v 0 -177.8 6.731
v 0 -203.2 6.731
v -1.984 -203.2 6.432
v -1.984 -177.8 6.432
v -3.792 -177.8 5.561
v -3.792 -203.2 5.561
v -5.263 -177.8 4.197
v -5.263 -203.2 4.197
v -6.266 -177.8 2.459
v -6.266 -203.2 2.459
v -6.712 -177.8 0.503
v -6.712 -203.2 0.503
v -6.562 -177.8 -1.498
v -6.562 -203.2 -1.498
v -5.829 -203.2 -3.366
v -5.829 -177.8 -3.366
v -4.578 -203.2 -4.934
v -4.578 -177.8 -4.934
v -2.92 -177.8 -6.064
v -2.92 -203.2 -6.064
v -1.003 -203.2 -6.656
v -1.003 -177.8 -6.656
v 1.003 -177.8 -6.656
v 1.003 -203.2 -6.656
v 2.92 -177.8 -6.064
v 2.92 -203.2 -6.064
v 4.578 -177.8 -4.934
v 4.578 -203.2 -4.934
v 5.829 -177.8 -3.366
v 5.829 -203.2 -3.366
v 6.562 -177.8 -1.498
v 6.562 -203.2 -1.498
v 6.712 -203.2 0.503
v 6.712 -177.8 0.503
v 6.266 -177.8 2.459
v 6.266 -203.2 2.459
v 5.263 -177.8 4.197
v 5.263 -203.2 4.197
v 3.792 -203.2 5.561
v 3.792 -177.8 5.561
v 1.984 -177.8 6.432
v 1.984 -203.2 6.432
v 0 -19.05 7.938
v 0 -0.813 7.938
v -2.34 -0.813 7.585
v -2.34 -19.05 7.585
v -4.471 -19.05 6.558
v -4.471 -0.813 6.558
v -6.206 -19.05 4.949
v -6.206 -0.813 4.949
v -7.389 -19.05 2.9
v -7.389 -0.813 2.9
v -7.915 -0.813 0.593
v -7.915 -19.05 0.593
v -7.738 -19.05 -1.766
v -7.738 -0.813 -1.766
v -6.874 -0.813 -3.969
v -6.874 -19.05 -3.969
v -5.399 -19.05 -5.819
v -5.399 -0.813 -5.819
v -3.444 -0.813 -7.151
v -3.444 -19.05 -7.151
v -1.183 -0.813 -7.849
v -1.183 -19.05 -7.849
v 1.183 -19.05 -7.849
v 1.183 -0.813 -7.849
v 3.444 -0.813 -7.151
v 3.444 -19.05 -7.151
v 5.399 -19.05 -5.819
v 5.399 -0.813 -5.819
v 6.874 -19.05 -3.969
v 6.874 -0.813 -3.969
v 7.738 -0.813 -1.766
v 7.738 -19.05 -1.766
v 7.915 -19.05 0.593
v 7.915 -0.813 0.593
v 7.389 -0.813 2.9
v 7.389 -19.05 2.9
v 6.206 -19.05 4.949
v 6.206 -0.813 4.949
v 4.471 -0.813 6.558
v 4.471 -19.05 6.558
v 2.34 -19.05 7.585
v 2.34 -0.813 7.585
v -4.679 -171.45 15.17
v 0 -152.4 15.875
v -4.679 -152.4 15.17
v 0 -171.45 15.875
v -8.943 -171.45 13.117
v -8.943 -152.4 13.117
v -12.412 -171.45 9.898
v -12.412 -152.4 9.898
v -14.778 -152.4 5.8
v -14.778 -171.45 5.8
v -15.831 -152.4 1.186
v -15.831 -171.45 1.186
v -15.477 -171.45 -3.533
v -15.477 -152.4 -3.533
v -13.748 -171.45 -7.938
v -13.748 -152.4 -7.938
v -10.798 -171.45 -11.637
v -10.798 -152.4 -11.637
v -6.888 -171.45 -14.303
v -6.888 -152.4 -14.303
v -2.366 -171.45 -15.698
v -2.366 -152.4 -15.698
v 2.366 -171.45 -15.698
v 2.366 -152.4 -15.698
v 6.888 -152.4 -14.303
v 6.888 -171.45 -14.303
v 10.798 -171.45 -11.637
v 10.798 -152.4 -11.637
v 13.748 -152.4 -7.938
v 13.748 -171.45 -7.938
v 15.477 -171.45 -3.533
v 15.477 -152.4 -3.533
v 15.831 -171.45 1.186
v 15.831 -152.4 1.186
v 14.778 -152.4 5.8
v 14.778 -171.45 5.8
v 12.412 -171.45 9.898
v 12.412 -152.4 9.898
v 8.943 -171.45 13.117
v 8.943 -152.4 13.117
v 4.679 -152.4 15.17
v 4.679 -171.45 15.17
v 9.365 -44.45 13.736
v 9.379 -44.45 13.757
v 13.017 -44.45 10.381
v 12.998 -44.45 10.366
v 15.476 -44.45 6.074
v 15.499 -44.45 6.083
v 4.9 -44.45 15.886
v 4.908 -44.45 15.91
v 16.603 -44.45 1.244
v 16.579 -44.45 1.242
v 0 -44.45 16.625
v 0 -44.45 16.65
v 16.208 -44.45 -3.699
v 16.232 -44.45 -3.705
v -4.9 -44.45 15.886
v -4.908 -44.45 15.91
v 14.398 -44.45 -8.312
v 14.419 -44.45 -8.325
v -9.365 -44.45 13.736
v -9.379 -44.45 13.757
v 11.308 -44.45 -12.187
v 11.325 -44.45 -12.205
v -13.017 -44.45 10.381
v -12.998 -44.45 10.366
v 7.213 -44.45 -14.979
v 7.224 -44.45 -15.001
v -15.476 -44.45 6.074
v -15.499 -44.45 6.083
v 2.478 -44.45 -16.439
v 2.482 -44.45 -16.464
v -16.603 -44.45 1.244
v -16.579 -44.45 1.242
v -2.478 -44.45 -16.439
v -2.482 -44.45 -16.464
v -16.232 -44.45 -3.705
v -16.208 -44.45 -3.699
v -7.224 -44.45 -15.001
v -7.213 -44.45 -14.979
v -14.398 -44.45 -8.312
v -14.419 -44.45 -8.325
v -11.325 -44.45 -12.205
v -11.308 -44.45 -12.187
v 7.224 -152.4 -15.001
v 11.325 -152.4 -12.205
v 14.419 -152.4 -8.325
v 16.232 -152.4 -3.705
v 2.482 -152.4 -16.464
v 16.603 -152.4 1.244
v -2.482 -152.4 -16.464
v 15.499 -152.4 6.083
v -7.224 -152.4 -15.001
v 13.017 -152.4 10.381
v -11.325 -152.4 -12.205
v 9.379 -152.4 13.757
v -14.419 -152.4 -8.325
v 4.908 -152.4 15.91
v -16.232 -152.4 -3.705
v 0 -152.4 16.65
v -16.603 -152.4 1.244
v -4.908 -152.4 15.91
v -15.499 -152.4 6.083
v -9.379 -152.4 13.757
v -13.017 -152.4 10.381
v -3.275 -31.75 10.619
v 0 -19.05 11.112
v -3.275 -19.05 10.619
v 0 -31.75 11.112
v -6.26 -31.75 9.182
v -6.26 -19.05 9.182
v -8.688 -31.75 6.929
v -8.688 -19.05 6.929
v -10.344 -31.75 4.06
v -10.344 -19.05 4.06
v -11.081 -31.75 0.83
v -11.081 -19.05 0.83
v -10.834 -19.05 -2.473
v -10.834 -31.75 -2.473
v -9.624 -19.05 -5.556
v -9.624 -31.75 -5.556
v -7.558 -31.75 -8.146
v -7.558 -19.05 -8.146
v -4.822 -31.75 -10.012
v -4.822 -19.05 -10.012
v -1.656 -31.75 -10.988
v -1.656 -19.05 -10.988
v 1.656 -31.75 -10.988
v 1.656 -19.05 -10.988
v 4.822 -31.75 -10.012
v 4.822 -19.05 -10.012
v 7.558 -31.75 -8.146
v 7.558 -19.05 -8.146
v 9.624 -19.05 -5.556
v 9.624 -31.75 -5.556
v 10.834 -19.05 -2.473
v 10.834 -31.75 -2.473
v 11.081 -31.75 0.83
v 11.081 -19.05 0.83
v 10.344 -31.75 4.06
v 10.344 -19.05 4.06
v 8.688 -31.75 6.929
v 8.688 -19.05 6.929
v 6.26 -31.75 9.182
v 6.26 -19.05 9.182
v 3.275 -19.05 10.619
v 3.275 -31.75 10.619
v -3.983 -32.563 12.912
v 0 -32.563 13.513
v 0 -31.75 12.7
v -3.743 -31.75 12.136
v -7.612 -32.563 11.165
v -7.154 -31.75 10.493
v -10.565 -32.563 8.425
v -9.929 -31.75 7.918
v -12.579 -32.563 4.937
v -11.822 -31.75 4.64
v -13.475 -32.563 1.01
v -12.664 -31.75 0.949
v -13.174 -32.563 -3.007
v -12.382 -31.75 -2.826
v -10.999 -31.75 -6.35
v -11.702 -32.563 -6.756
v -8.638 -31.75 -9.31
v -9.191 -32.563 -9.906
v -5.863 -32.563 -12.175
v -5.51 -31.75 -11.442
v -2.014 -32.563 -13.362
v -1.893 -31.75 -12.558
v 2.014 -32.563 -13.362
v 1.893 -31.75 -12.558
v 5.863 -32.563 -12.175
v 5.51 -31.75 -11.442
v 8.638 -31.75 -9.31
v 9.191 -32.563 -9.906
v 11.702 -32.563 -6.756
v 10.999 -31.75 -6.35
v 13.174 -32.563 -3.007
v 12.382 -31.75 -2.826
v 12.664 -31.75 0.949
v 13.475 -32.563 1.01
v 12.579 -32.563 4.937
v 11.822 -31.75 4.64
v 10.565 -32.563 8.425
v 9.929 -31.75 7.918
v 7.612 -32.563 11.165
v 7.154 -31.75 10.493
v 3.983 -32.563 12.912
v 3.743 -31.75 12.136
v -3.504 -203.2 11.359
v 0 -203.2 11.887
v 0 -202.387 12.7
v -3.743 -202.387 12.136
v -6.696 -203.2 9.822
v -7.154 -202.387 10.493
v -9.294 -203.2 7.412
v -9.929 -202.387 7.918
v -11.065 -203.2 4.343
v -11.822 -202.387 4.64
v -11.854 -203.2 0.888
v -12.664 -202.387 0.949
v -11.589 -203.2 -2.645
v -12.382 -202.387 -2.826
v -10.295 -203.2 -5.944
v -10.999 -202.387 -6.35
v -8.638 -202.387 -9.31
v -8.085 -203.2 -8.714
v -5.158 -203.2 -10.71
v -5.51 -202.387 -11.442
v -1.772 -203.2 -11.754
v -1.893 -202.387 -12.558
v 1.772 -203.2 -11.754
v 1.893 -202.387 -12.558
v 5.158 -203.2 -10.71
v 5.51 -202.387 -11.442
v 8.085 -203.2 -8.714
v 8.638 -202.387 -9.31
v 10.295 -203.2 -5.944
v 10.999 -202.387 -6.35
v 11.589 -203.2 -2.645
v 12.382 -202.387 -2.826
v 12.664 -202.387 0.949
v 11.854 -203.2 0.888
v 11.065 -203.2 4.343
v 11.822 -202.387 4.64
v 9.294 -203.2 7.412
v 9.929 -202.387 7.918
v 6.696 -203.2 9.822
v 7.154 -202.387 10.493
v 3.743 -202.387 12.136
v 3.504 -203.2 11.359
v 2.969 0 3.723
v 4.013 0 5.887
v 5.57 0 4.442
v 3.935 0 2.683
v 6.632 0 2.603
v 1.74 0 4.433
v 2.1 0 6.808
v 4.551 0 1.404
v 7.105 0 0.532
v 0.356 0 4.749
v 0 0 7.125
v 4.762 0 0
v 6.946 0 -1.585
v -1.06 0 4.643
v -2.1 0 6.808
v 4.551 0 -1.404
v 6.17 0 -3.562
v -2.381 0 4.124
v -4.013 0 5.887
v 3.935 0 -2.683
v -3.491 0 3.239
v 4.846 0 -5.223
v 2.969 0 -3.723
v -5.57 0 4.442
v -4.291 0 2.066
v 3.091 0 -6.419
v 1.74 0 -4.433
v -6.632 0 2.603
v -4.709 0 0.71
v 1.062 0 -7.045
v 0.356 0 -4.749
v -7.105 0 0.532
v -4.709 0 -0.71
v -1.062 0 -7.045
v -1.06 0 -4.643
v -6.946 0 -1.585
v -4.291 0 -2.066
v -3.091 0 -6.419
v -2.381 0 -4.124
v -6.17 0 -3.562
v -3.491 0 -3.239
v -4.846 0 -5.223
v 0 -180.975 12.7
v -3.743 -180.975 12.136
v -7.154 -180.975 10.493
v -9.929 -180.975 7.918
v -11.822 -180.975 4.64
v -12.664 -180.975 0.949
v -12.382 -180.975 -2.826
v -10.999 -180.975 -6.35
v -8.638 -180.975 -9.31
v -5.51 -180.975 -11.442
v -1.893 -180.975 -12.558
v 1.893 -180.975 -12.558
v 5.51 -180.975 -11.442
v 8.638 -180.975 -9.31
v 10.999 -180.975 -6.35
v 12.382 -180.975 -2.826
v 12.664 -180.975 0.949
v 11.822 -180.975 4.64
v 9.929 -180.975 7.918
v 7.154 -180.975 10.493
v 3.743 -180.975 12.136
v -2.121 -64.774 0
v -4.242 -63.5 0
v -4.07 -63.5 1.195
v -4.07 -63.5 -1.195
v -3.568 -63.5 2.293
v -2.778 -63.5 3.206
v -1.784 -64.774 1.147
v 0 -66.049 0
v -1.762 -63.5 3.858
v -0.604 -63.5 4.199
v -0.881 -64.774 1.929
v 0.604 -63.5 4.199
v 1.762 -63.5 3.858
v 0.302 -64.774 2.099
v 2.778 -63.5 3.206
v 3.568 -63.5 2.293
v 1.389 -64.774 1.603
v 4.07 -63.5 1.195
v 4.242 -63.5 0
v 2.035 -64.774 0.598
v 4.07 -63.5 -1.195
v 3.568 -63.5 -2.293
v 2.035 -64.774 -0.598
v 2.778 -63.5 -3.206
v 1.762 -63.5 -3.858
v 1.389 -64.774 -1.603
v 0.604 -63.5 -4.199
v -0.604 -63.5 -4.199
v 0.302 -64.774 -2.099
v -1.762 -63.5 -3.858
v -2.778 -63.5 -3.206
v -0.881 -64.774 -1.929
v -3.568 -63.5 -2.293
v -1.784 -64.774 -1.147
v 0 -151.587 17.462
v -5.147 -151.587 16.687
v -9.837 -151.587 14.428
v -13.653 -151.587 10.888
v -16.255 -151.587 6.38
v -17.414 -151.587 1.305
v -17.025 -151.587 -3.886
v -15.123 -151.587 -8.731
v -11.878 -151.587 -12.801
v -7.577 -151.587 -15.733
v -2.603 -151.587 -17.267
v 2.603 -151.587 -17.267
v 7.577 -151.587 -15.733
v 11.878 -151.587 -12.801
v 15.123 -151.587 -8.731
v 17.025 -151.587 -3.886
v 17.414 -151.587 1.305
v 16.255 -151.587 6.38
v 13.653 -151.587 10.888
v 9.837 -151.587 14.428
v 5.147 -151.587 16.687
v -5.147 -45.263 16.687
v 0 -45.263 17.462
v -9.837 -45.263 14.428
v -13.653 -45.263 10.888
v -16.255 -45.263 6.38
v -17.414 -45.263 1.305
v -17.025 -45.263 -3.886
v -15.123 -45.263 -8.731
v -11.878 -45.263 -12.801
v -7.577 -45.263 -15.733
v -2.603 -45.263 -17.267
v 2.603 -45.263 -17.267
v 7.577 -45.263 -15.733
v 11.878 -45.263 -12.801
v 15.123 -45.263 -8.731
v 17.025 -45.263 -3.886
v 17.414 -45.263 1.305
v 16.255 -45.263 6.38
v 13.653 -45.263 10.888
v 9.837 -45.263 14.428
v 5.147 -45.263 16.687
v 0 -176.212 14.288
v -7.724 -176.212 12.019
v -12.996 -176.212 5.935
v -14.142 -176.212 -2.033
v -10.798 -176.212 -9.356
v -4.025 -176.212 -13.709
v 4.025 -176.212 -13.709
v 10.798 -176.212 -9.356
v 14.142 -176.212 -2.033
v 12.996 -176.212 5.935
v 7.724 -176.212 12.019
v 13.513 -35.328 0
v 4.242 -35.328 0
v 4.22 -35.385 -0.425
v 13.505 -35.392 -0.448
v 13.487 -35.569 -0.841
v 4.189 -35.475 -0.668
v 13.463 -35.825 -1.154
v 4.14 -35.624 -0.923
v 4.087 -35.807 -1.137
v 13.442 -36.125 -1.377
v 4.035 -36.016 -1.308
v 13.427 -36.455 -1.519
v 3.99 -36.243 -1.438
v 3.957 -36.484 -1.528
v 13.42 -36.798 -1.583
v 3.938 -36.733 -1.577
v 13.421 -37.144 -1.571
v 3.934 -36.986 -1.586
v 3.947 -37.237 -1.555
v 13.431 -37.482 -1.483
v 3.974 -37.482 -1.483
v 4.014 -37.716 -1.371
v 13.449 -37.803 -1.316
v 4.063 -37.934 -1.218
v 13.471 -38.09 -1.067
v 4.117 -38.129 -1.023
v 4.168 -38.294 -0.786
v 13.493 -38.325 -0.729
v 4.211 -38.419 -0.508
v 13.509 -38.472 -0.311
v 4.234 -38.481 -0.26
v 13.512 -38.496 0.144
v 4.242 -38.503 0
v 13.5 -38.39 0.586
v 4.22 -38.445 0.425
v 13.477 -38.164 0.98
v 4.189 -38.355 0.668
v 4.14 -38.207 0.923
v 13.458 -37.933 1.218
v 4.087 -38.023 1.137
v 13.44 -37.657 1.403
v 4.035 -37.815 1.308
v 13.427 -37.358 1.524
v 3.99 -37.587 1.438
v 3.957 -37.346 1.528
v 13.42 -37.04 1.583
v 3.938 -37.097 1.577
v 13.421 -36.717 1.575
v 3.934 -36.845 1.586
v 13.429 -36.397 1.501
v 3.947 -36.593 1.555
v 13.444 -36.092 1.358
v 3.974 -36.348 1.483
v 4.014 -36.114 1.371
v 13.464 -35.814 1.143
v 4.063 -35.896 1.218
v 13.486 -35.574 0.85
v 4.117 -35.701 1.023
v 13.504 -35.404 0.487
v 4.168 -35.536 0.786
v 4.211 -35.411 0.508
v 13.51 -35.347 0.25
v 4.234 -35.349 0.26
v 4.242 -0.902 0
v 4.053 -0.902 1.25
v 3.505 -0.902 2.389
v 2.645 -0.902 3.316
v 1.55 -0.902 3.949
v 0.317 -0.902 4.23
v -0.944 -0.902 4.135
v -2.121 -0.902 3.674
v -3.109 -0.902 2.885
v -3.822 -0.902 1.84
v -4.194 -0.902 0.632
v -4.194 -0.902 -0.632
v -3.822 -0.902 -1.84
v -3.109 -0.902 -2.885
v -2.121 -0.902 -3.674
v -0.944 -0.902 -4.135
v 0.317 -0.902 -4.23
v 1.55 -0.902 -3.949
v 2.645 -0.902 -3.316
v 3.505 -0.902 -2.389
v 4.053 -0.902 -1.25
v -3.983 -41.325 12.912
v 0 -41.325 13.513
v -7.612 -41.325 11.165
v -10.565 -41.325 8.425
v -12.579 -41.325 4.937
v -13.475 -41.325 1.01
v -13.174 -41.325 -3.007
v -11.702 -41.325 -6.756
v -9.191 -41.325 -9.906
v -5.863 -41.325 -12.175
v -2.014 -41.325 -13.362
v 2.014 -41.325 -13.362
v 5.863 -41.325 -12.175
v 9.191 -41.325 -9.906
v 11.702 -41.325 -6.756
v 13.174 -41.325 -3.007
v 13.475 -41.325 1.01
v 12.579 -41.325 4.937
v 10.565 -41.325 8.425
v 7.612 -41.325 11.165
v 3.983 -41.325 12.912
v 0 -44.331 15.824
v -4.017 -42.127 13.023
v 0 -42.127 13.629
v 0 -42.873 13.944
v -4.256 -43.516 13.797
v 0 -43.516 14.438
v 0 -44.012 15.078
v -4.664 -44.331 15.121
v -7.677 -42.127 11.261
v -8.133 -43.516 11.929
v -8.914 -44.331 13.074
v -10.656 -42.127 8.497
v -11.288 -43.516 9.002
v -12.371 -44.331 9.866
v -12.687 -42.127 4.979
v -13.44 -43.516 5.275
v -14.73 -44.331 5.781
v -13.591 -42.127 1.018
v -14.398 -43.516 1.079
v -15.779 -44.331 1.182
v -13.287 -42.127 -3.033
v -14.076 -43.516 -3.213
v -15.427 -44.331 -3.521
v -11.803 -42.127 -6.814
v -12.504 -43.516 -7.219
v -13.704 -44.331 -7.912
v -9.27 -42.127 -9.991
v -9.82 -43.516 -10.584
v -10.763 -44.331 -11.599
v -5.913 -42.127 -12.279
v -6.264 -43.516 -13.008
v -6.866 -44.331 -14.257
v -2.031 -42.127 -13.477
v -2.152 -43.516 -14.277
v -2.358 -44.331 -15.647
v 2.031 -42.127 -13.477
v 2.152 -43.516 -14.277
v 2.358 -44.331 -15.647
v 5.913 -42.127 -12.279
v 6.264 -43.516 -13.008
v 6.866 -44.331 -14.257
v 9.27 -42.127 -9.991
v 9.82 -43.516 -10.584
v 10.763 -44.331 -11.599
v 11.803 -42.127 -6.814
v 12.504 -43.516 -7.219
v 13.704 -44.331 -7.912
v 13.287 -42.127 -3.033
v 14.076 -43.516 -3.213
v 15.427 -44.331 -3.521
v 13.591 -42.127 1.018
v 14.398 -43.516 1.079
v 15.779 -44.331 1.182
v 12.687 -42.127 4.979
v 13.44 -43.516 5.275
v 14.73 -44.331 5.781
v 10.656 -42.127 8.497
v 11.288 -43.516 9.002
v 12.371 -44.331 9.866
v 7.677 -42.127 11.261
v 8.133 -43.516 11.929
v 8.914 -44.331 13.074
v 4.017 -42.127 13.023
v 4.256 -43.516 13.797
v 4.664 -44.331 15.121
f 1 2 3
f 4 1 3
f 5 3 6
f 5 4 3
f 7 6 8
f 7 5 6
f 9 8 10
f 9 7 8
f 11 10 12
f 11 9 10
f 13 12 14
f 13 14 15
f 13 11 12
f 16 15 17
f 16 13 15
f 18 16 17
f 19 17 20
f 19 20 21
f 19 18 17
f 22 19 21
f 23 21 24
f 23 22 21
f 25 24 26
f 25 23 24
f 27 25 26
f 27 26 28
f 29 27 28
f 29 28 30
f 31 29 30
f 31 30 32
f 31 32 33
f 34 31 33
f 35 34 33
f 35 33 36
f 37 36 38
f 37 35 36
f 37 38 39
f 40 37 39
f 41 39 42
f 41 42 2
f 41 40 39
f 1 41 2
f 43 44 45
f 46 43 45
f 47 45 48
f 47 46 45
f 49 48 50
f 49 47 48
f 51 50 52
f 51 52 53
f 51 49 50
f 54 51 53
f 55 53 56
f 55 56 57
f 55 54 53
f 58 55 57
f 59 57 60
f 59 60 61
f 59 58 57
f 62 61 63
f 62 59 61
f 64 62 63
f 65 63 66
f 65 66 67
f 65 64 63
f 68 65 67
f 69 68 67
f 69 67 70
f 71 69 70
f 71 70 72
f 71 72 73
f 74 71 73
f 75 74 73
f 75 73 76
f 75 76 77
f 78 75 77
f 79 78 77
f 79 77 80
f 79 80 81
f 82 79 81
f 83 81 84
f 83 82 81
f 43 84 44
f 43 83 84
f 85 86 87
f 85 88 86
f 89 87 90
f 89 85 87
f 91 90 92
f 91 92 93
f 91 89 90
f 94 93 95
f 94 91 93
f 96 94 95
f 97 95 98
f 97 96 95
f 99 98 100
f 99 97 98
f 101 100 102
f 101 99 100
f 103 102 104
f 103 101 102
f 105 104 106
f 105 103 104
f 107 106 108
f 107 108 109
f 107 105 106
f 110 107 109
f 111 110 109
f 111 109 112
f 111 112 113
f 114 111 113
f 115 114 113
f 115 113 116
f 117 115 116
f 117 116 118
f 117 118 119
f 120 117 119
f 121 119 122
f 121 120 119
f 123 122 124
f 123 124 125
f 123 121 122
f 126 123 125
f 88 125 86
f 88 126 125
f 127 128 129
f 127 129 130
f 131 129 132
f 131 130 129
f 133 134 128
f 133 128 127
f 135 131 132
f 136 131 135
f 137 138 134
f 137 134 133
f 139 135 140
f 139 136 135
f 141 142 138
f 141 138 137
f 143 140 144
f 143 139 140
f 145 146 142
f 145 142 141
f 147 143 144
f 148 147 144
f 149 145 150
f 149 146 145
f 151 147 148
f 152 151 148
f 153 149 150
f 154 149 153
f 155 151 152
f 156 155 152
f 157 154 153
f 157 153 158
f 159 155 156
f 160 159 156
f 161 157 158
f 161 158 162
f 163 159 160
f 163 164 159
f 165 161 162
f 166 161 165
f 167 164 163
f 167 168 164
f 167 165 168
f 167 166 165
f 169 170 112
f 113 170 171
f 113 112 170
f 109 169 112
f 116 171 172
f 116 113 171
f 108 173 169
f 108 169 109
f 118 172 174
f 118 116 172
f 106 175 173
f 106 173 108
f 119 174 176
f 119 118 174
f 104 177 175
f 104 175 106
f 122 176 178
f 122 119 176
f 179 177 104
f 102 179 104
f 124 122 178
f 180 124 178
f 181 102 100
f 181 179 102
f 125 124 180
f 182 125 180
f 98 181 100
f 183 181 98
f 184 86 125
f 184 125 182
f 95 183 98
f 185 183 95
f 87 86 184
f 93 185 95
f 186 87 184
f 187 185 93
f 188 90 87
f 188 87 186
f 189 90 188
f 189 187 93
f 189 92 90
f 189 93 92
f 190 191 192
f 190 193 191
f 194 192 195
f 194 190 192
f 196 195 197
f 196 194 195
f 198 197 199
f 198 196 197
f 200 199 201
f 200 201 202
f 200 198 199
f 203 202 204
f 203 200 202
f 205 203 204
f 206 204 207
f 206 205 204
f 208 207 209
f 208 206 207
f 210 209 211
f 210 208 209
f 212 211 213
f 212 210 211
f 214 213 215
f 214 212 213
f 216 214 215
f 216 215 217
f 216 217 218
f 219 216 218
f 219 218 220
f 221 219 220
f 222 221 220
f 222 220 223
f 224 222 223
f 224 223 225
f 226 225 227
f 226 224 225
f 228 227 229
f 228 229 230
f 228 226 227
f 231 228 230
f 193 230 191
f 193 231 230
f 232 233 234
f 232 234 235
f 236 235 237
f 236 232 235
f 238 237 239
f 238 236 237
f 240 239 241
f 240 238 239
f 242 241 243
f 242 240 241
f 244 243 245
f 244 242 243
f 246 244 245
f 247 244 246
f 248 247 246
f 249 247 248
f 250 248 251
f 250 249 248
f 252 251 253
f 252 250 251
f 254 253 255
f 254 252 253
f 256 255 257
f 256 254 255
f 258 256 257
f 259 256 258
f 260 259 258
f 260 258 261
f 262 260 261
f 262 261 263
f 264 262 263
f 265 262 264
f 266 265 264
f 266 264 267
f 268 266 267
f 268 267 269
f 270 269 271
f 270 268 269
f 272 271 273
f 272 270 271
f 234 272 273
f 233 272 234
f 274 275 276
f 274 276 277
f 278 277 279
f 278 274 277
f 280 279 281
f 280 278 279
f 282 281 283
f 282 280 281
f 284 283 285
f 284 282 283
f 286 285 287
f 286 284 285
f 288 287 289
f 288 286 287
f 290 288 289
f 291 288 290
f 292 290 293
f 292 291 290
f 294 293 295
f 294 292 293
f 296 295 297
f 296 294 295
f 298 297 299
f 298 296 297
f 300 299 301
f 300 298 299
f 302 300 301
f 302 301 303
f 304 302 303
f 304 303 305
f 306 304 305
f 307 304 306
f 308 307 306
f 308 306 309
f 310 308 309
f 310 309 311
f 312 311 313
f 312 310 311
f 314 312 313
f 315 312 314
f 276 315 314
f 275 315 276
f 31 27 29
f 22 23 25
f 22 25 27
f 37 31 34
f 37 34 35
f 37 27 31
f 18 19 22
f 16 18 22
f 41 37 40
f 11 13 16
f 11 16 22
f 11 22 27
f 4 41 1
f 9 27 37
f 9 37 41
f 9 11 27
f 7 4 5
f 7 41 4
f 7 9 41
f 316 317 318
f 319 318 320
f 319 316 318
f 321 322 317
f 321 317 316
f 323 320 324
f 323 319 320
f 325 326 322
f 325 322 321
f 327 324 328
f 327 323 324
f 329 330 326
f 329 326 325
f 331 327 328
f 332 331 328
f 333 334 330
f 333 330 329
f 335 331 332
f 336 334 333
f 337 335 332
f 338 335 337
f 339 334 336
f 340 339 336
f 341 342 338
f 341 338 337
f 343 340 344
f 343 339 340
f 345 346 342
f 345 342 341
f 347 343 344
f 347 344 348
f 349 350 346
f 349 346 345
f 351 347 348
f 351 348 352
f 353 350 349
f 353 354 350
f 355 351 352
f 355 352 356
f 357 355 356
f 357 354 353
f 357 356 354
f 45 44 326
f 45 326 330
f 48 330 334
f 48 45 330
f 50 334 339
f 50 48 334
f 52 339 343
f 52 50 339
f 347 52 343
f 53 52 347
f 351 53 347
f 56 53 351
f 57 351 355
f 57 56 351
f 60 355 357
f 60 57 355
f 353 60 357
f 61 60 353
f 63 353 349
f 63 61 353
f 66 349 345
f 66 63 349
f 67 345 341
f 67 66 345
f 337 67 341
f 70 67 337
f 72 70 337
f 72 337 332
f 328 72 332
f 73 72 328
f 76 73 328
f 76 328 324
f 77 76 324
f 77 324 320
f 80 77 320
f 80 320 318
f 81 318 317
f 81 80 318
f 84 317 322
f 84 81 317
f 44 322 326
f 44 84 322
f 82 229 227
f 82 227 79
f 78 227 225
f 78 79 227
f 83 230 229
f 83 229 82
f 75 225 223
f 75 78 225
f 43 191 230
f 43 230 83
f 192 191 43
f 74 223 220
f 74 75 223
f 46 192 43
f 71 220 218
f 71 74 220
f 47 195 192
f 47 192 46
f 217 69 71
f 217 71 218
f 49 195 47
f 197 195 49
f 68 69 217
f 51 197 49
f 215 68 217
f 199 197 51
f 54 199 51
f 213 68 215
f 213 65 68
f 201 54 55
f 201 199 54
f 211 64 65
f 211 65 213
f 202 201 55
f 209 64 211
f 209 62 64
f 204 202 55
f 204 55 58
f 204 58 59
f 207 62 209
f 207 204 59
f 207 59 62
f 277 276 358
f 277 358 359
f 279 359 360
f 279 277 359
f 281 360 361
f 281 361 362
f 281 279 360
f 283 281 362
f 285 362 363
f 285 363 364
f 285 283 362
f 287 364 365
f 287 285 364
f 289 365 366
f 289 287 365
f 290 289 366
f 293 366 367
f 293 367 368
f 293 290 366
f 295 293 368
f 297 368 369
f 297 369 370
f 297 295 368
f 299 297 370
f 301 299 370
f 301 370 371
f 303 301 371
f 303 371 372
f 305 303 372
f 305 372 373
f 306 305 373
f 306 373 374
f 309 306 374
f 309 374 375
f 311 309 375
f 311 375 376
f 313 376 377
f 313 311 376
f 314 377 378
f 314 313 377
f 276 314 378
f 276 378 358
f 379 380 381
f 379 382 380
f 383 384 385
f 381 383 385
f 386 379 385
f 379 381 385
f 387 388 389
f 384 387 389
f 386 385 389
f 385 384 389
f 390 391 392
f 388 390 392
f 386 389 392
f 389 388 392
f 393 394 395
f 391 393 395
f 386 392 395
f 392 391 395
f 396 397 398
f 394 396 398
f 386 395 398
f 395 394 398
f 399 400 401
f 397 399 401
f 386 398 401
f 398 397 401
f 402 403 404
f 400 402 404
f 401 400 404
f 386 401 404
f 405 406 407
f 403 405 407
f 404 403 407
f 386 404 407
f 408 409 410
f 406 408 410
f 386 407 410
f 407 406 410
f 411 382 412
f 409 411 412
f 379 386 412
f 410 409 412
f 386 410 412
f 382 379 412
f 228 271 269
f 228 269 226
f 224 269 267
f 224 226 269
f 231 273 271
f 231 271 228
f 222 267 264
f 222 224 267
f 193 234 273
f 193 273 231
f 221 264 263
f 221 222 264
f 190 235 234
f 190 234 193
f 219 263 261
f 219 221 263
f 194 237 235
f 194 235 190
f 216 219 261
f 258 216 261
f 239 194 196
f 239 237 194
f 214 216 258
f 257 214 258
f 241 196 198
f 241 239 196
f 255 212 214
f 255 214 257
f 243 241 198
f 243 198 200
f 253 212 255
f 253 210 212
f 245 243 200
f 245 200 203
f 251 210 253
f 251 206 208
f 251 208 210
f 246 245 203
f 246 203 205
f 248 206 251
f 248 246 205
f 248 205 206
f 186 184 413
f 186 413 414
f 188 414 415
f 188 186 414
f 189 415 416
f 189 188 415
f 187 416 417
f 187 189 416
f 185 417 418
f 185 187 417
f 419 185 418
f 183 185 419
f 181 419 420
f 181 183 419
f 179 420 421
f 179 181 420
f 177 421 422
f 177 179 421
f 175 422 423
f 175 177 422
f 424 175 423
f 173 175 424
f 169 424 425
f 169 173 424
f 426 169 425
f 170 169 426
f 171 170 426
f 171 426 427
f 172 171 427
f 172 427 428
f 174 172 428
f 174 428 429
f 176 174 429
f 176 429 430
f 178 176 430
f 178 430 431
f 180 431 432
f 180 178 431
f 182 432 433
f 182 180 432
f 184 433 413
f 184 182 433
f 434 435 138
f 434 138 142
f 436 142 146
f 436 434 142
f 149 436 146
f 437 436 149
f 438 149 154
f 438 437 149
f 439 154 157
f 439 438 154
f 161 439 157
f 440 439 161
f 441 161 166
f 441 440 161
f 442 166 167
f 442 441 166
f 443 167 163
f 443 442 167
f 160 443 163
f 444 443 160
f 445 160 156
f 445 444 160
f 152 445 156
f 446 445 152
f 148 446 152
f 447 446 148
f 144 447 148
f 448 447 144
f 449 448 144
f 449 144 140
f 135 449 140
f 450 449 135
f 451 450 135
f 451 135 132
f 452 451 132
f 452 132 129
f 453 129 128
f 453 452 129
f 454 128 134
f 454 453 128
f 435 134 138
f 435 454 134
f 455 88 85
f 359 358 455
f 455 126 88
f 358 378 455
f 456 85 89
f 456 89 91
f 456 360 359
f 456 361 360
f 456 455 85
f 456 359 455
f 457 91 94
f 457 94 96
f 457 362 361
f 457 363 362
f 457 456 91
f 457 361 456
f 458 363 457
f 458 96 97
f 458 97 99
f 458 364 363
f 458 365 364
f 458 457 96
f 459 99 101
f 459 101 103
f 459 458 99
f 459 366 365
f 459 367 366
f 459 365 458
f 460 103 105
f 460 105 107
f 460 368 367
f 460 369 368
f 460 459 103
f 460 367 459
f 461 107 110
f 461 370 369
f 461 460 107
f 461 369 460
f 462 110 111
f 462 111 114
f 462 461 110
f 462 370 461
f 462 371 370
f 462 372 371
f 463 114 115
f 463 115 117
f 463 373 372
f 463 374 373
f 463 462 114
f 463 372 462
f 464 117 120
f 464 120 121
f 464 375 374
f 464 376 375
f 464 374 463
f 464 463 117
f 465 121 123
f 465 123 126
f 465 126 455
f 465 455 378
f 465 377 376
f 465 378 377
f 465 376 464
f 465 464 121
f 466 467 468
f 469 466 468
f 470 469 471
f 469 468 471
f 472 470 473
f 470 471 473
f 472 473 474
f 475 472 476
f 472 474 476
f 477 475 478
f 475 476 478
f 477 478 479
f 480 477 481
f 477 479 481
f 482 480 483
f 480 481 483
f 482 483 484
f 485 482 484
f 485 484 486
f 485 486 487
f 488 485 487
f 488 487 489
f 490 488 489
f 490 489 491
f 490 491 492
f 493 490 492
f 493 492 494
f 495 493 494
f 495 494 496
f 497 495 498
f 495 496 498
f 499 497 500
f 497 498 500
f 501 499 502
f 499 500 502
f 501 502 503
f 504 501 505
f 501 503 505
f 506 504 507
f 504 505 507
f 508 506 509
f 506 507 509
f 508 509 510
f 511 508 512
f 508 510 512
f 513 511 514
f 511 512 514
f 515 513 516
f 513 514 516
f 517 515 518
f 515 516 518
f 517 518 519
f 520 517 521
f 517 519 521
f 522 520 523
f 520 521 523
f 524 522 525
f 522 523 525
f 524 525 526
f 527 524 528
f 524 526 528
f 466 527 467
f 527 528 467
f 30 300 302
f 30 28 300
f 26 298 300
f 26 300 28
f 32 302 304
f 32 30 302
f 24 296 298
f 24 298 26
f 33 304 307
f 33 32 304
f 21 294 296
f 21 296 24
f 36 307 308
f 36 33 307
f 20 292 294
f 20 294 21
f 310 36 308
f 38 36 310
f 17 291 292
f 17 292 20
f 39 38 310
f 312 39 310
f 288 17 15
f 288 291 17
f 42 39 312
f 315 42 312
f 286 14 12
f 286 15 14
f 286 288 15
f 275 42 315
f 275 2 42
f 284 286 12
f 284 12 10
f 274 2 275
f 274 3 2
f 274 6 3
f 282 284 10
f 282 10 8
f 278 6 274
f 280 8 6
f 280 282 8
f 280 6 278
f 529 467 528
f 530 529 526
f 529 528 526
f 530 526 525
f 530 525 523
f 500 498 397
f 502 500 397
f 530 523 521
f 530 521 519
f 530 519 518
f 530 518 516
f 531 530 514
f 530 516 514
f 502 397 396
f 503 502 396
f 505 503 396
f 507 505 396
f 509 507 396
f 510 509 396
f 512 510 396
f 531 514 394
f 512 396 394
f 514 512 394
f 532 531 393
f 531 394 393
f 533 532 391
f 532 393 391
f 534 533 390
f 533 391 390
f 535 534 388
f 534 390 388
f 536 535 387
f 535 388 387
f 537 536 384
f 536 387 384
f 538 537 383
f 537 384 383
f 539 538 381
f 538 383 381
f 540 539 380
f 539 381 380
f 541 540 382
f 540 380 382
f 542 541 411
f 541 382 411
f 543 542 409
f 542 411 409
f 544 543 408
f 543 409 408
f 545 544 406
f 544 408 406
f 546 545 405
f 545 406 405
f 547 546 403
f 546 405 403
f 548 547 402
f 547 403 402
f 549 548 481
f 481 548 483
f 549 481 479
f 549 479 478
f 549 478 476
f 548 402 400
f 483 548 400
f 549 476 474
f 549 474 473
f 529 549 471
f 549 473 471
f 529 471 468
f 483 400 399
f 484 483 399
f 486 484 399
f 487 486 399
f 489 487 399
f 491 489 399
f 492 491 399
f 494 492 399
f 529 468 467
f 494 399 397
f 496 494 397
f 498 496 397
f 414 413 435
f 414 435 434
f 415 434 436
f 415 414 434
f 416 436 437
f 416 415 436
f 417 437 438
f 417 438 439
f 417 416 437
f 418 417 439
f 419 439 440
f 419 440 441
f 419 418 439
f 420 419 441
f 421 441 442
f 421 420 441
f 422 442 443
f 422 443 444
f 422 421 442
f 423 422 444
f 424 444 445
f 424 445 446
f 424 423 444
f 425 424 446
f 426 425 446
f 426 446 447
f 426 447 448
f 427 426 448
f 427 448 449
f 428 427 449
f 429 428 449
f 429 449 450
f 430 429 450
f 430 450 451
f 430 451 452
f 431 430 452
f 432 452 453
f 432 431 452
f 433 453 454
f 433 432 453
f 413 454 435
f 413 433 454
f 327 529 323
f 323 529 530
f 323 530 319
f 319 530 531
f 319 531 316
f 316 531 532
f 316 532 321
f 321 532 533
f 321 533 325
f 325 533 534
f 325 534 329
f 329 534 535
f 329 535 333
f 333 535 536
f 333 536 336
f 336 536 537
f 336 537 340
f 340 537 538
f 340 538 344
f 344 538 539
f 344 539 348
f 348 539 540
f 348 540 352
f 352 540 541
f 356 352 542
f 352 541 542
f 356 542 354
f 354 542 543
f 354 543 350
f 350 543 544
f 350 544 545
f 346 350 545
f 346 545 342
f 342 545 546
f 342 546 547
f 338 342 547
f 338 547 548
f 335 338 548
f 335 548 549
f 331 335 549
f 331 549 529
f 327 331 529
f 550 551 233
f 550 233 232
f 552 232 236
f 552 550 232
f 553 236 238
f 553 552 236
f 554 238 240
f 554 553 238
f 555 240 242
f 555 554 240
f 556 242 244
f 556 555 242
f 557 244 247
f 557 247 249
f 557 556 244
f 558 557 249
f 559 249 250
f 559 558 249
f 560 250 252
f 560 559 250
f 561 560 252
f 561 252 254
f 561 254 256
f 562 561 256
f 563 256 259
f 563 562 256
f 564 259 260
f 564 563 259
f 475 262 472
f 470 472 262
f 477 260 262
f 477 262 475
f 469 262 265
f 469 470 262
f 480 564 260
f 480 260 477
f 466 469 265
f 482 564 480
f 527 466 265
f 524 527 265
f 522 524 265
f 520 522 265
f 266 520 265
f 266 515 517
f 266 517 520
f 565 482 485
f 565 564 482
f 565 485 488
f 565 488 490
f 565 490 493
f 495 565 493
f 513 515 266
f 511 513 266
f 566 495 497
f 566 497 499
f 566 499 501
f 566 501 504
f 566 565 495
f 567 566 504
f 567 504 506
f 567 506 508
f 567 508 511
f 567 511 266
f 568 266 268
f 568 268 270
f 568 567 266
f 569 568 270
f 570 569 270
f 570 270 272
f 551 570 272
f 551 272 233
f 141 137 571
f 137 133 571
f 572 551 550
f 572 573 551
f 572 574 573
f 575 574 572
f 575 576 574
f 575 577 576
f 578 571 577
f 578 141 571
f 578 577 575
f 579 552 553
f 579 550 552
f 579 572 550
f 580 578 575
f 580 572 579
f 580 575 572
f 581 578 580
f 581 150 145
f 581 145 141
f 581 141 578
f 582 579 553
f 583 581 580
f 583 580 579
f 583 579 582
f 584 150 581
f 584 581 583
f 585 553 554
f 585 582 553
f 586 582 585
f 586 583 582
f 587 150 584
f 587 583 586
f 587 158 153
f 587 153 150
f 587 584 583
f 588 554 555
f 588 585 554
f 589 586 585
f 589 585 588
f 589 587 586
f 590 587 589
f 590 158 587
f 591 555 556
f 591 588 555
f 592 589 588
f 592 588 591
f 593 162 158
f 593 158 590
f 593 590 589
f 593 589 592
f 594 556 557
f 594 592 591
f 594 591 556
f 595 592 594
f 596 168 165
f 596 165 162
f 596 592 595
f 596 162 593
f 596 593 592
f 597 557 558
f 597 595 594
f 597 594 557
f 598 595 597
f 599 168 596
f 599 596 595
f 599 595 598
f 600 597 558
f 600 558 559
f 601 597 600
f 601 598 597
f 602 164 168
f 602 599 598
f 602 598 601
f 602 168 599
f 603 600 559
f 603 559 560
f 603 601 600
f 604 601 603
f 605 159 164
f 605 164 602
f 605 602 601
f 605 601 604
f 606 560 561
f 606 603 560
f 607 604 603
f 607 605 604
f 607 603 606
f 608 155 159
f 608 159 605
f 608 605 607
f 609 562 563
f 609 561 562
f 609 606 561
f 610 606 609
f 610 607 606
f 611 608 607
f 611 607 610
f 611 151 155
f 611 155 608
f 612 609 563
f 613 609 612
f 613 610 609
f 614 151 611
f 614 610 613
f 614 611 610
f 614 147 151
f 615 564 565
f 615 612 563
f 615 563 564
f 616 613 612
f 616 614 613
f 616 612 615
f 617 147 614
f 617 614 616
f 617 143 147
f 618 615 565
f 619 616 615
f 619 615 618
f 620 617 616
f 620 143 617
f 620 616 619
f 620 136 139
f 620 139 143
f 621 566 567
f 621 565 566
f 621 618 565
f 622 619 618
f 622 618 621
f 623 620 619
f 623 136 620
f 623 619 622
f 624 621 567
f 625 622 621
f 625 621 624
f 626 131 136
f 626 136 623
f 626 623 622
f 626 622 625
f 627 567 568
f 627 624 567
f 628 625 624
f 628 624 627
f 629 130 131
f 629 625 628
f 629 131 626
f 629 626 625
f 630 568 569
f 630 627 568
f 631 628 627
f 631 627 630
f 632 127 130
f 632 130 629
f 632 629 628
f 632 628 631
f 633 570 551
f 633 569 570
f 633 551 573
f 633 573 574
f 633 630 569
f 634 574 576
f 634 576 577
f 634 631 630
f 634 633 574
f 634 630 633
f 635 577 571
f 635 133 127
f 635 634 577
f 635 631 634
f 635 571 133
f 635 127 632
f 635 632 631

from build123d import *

# Parameters (mm, degrees)
F2_SIZE        = 0.8128
F5_D           = 8.4836
F5_DEPTH       = 63.5
F5_CSINK_D     = 9.525
F5_CSINK_ANGLE = 60
F5_TIP         = 2.5487305738
F7_D           = 3.175
F7_DEPTH       = 38.1
F7_TIP         = 0.9538662327


# Not quite as in the source:
# - a fillet or chamfer that OpenCascade refuses, or shapes differently, is made with other operations: its cross-section is extruded or revolved along the edge and cut away or added


with BuildPart() as f1:
    # F0 (on Right) → F1 (revolve)
    with BuildSketch(Plane.YZ):
        Polygon((-177.8, 0), (0, 0), (0, 7.9375), (-19.05, 7.9375), (-19.05, 11.1125), (-31.75, 11.1125), (-31.75, 13.5128), (-44.45, 13.5128), (-44.45, 17.4625), (-152.4, 17.4625), (-152.4, 15.875), (-171.45, 15.875), (-180.975, 12.7), (-203.2, 12.7), (-203.2, 6.731), (-177.8, 6.731), align=None)
    revolve(axis=Axis((0, -88.9, 0), (0, -1, 0)))

    # F2
    f2_edges = [f1.edges().sort_by_distance(p)[0] for p in [
        (0, -203.2, -12.7),
        (0, -152.4, -17.4625),
        (0, -44.45, -17.4625),
        (0, -31.75, -13.5128),
        (0, 0, -7.9375),
    ]]
    chamfer(f2_edges, length=F2_SIZE)

    # F3: fillet of radius 3.175 on 1 edges, made by hand

    # F3_s1 → F3_t2 (revolve)
    with BuildSketch(Plane.YZ):
        with BuildLine():
            ThreePointArc((-41.2742745857, 13.5124), (-43.5064480149, 14.4289646435), (-44.4503999697, 16.6496950798))
            Line((-44.4503999697, 16.6496950798), (-44.7680125081, 16.6457880193))
            ThreePointArc((-44.7680125081, 16.6457880193), (-44.7676365685, 15.0812475399), (-44.7676365685, 13.5128))
            Line((-44.7676365685, 13.5128), (-44.45, 13.1951634315))
            ThreePointArc((-44.45, 13.1951634315), (-42.8621372928, 13.1951634315), (-41.2742745857, 13.1947634315))
            Line((-41.2742745857, 13.1947634315), (-41.2742745857, 13.5124))
        make_face()
    revolve(axis=Axis((0, -44.45, 0), (0, -1, 0)))

    # F5
    with Locations(Plane(origin=(0, 0, 0), x_dir=(-1, 0, 0), z_dir=(0, 1, 0))):
        with Locations((0, 0)):
            CounterSinkHole(F5_D / 2, F5_CSINK_D / 2, depth=F5_DEPTH, counter_sink_angle=F5_CSINK_ANGLE)
            with Locations((0, 0, -(F5_DEPTH + F5_TIP / 2))):  # 118° drill point
                Cone(0, F5_D / 2, F5_TIP, mode=Mode.SUBTRACT)

    # F7 (one way)
    with BuildSketch(Plane(origin=(0, 0, 0), x_dir=(0, 1, 0), z_dir=(-1, 0, 0))):
        with Locations((-36.915011704, 0)):
            Circle(F7_D / 2)
    extrude(amount=-F7_DEPTH, mode=Mode.SUBTRACT)
    with Locations(Plane(origin=(0, 0, 0), x_dir=(0, 1, 0), z_dir=(-1, 0, 0))):
        with Locations((-36.915011704, 0)):
            with Locations((0, 0, -(F7_DEPTH + F7_TIP / 2))):  # 118° drill point
                Cone(0, F7_D / 2, F7_TIP, mode=Mode.SUBTRACT)


solid = f1.part
